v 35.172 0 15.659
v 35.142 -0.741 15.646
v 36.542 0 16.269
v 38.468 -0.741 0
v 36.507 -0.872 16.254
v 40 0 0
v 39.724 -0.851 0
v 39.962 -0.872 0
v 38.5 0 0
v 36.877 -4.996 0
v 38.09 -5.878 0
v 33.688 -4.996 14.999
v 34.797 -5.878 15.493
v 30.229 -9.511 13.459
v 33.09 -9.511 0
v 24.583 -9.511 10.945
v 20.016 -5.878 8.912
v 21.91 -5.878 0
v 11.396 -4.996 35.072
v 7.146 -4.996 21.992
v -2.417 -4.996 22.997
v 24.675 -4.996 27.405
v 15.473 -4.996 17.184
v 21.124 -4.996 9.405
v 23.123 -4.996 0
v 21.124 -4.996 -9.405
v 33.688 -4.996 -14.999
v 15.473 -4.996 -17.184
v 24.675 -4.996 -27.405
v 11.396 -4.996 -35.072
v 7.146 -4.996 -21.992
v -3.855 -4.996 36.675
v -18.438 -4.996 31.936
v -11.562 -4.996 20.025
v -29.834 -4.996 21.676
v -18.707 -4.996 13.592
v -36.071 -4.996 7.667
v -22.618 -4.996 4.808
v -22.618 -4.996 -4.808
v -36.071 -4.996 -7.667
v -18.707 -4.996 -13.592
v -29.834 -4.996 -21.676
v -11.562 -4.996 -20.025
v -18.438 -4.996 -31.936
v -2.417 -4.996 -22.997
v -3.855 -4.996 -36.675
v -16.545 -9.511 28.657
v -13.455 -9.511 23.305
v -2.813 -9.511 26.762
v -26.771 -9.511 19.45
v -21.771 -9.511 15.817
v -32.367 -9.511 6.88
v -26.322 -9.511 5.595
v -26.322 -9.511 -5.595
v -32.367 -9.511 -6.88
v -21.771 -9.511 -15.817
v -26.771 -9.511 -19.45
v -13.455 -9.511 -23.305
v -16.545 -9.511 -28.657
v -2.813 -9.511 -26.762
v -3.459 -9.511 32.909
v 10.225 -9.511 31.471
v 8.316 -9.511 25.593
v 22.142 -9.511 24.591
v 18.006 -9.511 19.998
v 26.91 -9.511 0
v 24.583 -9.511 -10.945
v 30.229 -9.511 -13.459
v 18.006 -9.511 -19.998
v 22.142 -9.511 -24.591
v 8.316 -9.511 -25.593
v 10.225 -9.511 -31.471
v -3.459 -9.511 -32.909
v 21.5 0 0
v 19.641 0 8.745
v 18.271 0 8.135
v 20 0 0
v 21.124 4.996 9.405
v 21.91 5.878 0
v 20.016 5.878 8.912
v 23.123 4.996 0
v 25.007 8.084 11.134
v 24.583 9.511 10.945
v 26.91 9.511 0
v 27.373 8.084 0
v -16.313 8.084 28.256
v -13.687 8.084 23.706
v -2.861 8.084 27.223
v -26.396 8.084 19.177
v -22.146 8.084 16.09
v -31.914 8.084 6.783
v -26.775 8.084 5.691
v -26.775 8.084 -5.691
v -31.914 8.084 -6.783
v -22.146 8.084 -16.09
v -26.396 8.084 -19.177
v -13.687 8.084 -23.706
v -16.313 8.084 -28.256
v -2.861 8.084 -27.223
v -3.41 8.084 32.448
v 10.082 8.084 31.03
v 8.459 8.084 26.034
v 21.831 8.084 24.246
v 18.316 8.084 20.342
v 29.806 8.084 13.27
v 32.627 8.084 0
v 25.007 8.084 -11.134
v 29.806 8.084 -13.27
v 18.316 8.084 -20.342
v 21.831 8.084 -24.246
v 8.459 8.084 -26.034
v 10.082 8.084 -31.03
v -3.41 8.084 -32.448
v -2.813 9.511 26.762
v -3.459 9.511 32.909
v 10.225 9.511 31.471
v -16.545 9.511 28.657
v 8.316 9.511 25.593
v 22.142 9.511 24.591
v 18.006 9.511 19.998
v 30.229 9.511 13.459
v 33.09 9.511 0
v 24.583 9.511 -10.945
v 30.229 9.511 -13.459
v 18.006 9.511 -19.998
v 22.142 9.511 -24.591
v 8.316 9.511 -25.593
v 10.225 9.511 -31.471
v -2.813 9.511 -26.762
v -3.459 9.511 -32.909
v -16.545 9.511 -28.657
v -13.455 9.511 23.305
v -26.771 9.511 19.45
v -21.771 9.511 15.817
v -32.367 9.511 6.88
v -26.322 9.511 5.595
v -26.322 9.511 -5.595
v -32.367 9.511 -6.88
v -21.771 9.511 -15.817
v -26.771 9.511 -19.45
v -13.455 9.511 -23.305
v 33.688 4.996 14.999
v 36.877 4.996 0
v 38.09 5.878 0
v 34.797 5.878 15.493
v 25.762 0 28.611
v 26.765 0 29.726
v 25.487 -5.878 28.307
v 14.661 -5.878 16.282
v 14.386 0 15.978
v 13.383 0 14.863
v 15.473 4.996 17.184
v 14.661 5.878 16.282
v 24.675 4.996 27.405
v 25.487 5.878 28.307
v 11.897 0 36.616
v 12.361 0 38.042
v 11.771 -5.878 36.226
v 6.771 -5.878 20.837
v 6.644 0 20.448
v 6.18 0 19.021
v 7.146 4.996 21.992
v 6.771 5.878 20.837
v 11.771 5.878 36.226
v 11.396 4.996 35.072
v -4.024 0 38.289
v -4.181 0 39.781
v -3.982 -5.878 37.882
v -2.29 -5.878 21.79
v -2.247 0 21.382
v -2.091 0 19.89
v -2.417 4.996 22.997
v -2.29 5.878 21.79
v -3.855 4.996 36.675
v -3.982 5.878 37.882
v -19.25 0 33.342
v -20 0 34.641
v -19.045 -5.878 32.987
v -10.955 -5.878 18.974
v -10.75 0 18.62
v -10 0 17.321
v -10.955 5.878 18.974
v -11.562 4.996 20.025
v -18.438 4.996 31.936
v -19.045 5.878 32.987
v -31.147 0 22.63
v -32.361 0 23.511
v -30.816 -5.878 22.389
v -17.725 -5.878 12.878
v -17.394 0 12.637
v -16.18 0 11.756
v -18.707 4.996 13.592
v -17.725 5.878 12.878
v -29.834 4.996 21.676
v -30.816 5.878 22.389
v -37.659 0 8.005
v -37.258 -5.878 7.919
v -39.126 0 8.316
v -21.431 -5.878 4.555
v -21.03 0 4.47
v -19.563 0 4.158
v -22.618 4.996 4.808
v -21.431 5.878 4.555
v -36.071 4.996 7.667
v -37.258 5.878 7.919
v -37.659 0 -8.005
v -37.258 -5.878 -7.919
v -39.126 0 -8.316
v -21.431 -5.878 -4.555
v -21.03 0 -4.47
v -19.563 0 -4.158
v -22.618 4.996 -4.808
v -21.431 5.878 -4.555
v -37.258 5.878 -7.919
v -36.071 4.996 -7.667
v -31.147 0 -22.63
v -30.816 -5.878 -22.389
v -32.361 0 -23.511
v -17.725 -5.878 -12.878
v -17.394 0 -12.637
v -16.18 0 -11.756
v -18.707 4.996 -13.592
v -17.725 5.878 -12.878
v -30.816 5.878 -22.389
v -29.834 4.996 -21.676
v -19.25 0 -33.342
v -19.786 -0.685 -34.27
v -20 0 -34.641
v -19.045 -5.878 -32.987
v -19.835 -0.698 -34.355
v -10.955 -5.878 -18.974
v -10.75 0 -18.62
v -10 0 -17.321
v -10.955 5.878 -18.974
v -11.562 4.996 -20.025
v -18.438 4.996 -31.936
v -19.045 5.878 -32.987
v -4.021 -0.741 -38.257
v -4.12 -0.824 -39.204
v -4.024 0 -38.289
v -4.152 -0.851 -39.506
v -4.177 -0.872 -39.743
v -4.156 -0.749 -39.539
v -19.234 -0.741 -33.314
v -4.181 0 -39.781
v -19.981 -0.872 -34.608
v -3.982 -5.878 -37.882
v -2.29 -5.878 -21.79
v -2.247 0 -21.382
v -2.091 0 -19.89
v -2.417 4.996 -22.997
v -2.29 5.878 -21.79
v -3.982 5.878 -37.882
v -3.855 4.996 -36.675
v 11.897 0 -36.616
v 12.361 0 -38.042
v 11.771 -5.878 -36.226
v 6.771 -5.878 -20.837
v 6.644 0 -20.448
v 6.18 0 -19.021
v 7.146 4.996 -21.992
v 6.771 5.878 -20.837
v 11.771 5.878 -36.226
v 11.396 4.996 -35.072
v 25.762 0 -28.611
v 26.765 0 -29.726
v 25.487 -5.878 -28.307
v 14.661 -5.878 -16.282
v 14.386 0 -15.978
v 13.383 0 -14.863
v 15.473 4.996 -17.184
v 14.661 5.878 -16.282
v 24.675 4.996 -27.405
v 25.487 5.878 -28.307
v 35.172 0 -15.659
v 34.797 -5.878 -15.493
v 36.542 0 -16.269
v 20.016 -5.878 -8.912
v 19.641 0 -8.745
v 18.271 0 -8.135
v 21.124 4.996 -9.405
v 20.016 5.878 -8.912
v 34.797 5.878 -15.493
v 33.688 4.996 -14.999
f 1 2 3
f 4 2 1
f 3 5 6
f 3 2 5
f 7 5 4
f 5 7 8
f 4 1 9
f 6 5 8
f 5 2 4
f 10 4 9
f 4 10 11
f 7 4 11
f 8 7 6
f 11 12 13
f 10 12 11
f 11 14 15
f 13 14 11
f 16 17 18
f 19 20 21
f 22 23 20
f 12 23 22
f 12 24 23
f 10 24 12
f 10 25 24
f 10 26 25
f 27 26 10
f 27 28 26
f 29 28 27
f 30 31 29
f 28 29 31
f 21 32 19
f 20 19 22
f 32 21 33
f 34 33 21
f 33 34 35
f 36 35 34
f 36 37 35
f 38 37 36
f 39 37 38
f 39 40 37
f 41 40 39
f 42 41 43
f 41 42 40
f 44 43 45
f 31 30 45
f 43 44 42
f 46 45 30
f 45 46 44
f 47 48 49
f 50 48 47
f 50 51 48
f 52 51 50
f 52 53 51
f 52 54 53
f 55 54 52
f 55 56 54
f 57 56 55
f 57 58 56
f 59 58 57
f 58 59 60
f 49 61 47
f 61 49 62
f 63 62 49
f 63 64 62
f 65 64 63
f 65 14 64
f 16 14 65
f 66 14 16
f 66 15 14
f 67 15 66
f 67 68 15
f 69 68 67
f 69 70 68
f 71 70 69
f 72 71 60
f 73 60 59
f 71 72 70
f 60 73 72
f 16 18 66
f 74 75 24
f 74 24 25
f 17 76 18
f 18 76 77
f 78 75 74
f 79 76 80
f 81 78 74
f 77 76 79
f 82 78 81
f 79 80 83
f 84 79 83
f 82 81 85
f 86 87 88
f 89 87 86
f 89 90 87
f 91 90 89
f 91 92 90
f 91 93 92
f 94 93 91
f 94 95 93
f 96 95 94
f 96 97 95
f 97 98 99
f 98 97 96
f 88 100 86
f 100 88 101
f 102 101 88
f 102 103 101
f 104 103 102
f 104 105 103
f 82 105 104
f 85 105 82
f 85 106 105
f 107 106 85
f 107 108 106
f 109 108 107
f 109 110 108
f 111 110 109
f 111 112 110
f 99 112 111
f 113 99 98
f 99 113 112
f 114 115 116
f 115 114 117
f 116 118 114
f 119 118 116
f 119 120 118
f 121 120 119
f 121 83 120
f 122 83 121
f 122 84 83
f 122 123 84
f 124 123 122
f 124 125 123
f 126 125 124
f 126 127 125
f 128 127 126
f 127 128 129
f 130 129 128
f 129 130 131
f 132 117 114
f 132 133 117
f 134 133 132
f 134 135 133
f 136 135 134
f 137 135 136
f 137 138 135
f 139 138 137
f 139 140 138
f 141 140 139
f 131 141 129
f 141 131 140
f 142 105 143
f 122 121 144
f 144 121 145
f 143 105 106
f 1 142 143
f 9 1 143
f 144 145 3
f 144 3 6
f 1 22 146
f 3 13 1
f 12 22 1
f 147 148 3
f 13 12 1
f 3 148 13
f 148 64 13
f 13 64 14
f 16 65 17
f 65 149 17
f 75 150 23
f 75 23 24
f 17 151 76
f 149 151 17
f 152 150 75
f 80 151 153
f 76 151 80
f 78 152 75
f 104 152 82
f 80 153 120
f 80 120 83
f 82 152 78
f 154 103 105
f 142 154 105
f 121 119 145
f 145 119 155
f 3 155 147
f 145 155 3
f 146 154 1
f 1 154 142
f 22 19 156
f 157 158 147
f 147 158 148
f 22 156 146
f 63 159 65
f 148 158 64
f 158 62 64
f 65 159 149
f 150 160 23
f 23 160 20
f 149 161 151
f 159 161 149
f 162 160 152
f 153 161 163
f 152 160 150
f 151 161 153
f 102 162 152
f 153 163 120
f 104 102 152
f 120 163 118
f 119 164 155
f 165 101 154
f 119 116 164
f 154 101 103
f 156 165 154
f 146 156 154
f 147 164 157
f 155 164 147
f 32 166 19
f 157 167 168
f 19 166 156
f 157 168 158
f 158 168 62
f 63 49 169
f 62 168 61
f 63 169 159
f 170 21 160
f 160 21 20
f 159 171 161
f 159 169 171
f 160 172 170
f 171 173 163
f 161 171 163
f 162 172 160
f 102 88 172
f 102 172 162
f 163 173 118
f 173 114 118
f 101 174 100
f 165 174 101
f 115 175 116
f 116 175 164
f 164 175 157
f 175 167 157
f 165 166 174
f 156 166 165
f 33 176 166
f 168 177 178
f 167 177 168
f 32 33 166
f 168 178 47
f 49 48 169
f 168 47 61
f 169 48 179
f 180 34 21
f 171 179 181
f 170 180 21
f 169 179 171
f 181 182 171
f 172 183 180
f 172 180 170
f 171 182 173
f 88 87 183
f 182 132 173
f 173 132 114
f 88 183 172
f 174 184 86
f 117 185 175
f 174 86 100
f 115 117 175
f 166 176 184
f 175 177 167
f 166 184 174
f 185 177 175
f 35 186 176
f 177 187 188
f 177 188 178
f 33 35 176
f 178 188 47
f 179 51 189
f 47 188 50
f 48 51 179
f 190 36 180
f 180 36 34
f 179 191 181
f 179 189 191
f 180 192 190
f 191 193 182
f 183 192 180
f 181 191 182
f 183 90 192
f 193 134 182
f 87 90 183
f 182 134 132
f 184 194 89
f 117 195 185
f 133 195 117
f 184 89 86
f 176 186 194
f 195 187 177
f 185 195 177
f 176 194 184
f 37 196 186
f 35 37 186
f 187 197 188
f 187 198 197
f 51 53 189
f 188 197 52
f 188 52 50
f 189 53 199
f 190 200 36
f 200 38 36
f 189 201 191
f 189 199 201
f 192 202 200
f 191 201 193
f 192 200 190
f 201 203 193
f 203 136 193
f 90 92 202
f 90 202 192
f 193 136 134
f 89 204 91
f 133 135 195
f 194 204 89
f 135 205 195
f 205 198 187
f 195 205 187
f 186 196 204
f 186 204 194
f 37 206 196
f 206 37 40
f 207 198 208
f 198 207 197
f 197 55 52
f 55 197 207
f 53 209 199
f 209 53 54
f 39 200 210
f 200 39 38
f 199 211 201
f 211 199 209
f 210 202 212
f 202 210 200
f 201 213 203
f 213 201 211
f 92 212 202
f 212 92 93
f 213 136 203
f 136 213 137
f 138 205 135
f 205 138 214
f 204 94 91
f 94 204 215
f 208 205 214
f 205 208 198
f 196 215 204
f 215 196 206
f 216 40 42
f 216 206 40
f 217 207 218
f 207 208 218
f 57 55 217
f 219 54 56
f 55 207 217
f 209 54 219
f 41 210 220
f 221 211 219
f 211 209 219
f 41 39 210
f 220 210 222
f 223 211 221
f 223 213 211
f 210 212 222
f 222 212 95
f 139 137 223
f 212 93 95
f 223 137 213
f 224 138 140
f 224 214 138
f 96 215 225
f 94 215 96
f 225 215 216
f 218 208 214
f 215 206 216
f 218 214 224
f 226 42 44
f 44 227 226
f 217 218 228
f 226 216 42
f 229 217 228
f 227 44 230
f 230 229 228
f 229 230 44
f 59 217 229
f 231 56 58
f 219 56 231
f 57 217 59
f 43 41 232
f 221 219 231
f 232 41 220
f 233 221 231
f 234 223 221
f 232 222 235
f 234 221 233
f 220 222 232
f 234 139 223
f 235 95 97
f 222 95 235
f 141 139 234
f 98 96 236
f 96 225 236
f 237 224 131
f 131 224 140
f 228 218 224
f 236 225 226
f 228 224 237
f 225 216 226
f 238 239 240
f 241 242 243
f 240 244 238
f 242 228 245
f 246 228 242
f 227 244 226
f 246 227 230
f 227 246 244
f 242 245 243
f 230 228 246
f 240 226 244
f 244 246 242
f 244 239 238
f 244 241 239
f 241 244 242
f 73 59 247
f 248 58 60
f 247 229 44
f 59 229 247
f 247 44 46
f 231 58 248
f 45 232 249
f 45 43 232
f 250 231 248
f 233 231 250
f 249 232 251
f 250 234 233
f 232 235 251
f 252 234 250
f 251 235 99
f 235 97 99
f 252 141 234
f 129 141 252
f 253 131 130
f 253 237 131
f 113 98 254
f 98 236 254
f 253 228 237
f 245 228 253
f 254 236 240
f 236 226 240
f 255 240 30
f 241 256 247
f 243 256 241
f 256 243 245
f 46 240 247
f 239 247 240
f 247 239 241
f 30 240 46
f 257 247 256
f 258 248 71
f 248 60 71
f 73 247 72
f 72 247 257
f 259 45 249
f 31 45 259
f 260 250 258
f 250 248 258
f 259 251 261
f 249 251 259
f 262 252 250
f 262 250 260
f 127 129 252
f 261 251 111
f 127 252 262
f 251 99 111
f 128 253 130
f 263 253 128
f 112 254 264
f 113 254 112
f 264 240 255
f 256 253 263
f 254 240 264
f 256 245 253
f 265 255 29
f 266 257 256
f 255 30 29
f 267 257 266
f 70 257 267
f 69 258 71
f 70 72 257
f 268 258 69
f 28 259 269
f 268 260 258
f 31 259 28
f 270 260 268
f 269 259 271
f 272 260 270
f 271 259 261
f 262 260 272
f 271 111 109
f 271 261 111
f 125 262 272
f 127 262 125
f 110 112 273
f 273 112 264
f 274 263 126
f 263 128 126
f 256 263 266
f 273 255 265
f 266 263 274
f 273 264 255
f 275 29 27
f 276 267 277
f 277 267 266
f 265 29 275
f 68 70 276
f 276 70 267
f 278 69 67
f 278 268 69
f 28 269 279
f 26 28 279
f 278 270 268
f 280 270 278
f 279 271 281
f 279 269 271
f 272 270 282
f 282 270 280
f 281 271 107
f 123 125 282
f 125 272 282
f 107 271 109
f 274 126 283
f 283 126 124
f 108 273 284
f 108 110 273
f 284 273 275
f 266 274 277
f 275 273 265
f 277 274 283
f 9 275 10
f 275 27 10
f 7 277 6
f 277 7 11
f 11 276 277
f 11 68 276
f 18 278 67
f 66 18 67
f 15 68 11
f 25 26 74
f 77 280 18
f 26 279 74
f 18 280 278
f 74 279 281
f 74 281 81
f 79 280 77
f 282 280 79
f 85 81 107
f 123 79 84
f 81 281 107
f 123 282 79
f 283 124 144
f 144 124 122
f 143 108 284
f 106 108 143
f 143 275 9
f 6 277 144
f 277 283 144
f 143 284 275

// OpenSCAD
torus_radius = 30;
chamber_radius = 10;
wall_thickness = 1.5;
tor_segments = 15;
pol_segments = 10;


// https://en.wikipedia.org/wiki/Toroidal_and_poloidal
// http://fusionwiki.ciemat.es/wiki/Toroidal_coordinates
// https://en.wikibooks.org/wiki/OpenSCAD_User_Manual/User-Defined_Functions_and_Modules

// R0 is radius from origin to center of circle that is swept to form torus
// r is radius of swept circle
// toroidal_angle controls direction of R0
// poloidal_angle controls direction of r
function toroidal_tor_x(R0, r, toroidal_angle, poloidal_angle) = (R0 + (r * cos(poloidal_angle))) * cos(toroidal_angle);
function toroidal_tor_y(R0, r, toroidal_angle, poloidal_angle) = (R0 + (r * cos(poloidal_angle))) * sin(toroidal_angle);
function toroidal_tor_z(R0, r, toroidal_angle, poloidal_angle) = r * sin(poloidal_angle);


module toroidal_section_by_angle(tor_low, tor_high, pol_low, pol_high) {
    p0x = toroidal_tor_x(torus_radius, chamber_radius - wall_thickness, tor_low, pol_low);
    p0y = toroidal_tor_y(torus_radius, chamber_radius - wall_thickness, tor_low, pol_low);
    p0z = toroidal_tor_z(torus_radius, chamber_radius - wall_thickness, tor_low, pol_low);

    p1x = toroidal_tor_x(torus_radius, chamber_radius - wall_thickness, tor_low, pol_high);
    p1y = toroidal_tor_y(torus_radius, chamber_radius - wall_thickness, tor_low, pol_high);
    p1z = toroidal_tor_z(torus_radius, chamber_radius - wall_thickness, tor_low, pol_high);

    p2x = toroidal_tor_x(torus_radius, chamber_radius - wall_thickness, tor_high, pol_high);
    p2y = toroidal_tor_y(torus_radius, chamber_radius - wall_thickness, tor_high, pol_high);
    p2z = toroidal_tor_z(torus_radius, chamber_radius - wall_thickness, tor_high, pol_high);

    p3x = toroidal_tor_x(torus_radius, chamber_radius - wall_thickness, tor_high, pol_low);
    p3y = toroidal_tor_y(torus_radius, chamber_radius - wall_thickness, tor_high, pol_low);
    p3z = toroidal_tor_z(torus_radius, chamber_radius - wall_thickness, tor_high, pol_low);

    p4x = toroidal_tor_x(torus_radius, chamber_radius, tor_low, pol_low);
    p4y = toroidal_tor_y(torus_radius, chamber_radius, tor_low, pol_low);
    p4z = toroidal_tor_z(torus_radius, chamber_radius, tor_low, pol_low);

    p5x = toroidal_tor_x(torus_radius, chamber_radius, tor_low, pol_high);
    p5y = toroidal_tor_y(torus_radius, chamber_radius, tor_low, pol_high);
    p5z = toroidal_tor_z(torus_radius, chamber_radius, tor_low, pol_high);

    p6x = toroidal_tor_x(torus_radius, chamber_radius, tor_high, pol_high);
    p6y = toroidal_tor_y(torus_radius, chamber_radius, tor_high, pol_high);
    p6z = toroidal_tor_z(torus_radius, chamber_radius, tor_high, pol_high);

    p7x = toroidal_tor_x(torus_radius, chamber_radius, tor_high, pol_low);
    p7y = toroidal_tor_y(torus_radius, chamber_radius, tor_high, pol_low);
    p7z = toroidal_tor_z(torus_radius, chamber_radius, tor_high, pol_low);

    polyhedron(
        points = [[p0x, p0y, p0z],
                  [p1x, p1y, p1z],
                  [p2x, p2y, p2z],
                  [p3x, p3y, p3z],
                  [p4x, p4y, p4z],
                  [p5x, p5y, p5z],
                  [p6x, p6y, p6z],
                  [p7x, p7y, p7z]],
        faces = [[1, 2, 3],
                 [3, 0, 1],
                 [5, 1, 0],
                 [0, 4, 5],
                 [6, 5, 4],
                 [4, 7, 6],
                 [2, 6, 2],
                 [7, 3, 2],
                 [0, 3, 7],
                 [7, 4, 0],
                 [5, 6, 2],
                 [2, 1, 5]
            ],

        convexity = 10);
}




module toroidal_section_by_index(toroidal_segment, poloidal_segment) {
    // tor_low = (toroidal_segment / tor_segments) * 360 + 5;
    // tor_high = ((toroidal_segment + 1) / tor_segments) * 360 - 5;
    // pol_low = (poloidal_segment / pol_segments) * 360 + 5;
    // pol_high = ((poloidal_segment + 1) / pol_segments) * 360 - 5;

    if ((toroidal_segment == 0 && poloidal_segment == 0) ||
        // (toroidal_segment == 5 && poloidal_segment == 0) ||
        (toroidal_segment == 10 && poloidal_segment == 0)
        ) {
        tor_low = (toroidal_segment / tor_segments) * 360;
        tor_high = ((toroidal_segment + 1) / tor_segments) * 360;
        pol_low = (poloidal_segment / pol_segments) * 360;
        pol_high = pol_low + 5;

        hull() {
            toroidal_section_by_angle(tor_low, tor_high, pol_low, pol_high);
        }
    } else {
        tor_low = (toroidal_segment / tor_segments) * 360;
        tor_high = ((toroidal_segment + 1) / tor_segments) * 360;
        pol_low = (poloidal_segment / pol_segments) * 360;
        pol_high = ((poloidal_segment + 1) / pol_segments) * 360;

        hull() {
            toroidal_section_by_angle(tor_low, tor_high, pol_low, pol_high);
        }
    }
}


module ring_section(tor_index, pol_index) {
    if (pol_index == 0) {
        // wall -- outer standing-height section
        toroidal_section_by_index(tor_index, 0);
    } else if (pol_index == 1) {
        // floor
        hull() {
            toroidal_section_by_index(tor_index, 1);
            toroidal_section_by_index(tor_index, 2);
            toroidal_section_by_index(tor_index, 3);
        }
    } else {
        // inner wall and ceiling
        toroidal_section_by_index(tor_index, pol_index + 2);
    }
}

part_index = -1;

if (part_index == -1) {
    union() {
        rotate([90, 0, 0]) {
            for (tor_index = [0 : 1 : tor_segments - 1]) {
                for (pol_index = [0 : 1 : pol_segments - 3]) {
                    ring_section(tor_index, pol_index);
                }
            }
        }
    }
} else {

    // tor_index goes from 0 to 14
    // pol_index goes from 0 to 8

    tor_index = part_index % tor_segments;
    pol_index = (part_index - tor_index) / tor_segments;

    echo();
    echo(tor_index);
    echo(pol_index);

    union() {
        rotate([90, 0, 0]) {
            ring_section(tor_index, pol_index);
        }
    }
}
